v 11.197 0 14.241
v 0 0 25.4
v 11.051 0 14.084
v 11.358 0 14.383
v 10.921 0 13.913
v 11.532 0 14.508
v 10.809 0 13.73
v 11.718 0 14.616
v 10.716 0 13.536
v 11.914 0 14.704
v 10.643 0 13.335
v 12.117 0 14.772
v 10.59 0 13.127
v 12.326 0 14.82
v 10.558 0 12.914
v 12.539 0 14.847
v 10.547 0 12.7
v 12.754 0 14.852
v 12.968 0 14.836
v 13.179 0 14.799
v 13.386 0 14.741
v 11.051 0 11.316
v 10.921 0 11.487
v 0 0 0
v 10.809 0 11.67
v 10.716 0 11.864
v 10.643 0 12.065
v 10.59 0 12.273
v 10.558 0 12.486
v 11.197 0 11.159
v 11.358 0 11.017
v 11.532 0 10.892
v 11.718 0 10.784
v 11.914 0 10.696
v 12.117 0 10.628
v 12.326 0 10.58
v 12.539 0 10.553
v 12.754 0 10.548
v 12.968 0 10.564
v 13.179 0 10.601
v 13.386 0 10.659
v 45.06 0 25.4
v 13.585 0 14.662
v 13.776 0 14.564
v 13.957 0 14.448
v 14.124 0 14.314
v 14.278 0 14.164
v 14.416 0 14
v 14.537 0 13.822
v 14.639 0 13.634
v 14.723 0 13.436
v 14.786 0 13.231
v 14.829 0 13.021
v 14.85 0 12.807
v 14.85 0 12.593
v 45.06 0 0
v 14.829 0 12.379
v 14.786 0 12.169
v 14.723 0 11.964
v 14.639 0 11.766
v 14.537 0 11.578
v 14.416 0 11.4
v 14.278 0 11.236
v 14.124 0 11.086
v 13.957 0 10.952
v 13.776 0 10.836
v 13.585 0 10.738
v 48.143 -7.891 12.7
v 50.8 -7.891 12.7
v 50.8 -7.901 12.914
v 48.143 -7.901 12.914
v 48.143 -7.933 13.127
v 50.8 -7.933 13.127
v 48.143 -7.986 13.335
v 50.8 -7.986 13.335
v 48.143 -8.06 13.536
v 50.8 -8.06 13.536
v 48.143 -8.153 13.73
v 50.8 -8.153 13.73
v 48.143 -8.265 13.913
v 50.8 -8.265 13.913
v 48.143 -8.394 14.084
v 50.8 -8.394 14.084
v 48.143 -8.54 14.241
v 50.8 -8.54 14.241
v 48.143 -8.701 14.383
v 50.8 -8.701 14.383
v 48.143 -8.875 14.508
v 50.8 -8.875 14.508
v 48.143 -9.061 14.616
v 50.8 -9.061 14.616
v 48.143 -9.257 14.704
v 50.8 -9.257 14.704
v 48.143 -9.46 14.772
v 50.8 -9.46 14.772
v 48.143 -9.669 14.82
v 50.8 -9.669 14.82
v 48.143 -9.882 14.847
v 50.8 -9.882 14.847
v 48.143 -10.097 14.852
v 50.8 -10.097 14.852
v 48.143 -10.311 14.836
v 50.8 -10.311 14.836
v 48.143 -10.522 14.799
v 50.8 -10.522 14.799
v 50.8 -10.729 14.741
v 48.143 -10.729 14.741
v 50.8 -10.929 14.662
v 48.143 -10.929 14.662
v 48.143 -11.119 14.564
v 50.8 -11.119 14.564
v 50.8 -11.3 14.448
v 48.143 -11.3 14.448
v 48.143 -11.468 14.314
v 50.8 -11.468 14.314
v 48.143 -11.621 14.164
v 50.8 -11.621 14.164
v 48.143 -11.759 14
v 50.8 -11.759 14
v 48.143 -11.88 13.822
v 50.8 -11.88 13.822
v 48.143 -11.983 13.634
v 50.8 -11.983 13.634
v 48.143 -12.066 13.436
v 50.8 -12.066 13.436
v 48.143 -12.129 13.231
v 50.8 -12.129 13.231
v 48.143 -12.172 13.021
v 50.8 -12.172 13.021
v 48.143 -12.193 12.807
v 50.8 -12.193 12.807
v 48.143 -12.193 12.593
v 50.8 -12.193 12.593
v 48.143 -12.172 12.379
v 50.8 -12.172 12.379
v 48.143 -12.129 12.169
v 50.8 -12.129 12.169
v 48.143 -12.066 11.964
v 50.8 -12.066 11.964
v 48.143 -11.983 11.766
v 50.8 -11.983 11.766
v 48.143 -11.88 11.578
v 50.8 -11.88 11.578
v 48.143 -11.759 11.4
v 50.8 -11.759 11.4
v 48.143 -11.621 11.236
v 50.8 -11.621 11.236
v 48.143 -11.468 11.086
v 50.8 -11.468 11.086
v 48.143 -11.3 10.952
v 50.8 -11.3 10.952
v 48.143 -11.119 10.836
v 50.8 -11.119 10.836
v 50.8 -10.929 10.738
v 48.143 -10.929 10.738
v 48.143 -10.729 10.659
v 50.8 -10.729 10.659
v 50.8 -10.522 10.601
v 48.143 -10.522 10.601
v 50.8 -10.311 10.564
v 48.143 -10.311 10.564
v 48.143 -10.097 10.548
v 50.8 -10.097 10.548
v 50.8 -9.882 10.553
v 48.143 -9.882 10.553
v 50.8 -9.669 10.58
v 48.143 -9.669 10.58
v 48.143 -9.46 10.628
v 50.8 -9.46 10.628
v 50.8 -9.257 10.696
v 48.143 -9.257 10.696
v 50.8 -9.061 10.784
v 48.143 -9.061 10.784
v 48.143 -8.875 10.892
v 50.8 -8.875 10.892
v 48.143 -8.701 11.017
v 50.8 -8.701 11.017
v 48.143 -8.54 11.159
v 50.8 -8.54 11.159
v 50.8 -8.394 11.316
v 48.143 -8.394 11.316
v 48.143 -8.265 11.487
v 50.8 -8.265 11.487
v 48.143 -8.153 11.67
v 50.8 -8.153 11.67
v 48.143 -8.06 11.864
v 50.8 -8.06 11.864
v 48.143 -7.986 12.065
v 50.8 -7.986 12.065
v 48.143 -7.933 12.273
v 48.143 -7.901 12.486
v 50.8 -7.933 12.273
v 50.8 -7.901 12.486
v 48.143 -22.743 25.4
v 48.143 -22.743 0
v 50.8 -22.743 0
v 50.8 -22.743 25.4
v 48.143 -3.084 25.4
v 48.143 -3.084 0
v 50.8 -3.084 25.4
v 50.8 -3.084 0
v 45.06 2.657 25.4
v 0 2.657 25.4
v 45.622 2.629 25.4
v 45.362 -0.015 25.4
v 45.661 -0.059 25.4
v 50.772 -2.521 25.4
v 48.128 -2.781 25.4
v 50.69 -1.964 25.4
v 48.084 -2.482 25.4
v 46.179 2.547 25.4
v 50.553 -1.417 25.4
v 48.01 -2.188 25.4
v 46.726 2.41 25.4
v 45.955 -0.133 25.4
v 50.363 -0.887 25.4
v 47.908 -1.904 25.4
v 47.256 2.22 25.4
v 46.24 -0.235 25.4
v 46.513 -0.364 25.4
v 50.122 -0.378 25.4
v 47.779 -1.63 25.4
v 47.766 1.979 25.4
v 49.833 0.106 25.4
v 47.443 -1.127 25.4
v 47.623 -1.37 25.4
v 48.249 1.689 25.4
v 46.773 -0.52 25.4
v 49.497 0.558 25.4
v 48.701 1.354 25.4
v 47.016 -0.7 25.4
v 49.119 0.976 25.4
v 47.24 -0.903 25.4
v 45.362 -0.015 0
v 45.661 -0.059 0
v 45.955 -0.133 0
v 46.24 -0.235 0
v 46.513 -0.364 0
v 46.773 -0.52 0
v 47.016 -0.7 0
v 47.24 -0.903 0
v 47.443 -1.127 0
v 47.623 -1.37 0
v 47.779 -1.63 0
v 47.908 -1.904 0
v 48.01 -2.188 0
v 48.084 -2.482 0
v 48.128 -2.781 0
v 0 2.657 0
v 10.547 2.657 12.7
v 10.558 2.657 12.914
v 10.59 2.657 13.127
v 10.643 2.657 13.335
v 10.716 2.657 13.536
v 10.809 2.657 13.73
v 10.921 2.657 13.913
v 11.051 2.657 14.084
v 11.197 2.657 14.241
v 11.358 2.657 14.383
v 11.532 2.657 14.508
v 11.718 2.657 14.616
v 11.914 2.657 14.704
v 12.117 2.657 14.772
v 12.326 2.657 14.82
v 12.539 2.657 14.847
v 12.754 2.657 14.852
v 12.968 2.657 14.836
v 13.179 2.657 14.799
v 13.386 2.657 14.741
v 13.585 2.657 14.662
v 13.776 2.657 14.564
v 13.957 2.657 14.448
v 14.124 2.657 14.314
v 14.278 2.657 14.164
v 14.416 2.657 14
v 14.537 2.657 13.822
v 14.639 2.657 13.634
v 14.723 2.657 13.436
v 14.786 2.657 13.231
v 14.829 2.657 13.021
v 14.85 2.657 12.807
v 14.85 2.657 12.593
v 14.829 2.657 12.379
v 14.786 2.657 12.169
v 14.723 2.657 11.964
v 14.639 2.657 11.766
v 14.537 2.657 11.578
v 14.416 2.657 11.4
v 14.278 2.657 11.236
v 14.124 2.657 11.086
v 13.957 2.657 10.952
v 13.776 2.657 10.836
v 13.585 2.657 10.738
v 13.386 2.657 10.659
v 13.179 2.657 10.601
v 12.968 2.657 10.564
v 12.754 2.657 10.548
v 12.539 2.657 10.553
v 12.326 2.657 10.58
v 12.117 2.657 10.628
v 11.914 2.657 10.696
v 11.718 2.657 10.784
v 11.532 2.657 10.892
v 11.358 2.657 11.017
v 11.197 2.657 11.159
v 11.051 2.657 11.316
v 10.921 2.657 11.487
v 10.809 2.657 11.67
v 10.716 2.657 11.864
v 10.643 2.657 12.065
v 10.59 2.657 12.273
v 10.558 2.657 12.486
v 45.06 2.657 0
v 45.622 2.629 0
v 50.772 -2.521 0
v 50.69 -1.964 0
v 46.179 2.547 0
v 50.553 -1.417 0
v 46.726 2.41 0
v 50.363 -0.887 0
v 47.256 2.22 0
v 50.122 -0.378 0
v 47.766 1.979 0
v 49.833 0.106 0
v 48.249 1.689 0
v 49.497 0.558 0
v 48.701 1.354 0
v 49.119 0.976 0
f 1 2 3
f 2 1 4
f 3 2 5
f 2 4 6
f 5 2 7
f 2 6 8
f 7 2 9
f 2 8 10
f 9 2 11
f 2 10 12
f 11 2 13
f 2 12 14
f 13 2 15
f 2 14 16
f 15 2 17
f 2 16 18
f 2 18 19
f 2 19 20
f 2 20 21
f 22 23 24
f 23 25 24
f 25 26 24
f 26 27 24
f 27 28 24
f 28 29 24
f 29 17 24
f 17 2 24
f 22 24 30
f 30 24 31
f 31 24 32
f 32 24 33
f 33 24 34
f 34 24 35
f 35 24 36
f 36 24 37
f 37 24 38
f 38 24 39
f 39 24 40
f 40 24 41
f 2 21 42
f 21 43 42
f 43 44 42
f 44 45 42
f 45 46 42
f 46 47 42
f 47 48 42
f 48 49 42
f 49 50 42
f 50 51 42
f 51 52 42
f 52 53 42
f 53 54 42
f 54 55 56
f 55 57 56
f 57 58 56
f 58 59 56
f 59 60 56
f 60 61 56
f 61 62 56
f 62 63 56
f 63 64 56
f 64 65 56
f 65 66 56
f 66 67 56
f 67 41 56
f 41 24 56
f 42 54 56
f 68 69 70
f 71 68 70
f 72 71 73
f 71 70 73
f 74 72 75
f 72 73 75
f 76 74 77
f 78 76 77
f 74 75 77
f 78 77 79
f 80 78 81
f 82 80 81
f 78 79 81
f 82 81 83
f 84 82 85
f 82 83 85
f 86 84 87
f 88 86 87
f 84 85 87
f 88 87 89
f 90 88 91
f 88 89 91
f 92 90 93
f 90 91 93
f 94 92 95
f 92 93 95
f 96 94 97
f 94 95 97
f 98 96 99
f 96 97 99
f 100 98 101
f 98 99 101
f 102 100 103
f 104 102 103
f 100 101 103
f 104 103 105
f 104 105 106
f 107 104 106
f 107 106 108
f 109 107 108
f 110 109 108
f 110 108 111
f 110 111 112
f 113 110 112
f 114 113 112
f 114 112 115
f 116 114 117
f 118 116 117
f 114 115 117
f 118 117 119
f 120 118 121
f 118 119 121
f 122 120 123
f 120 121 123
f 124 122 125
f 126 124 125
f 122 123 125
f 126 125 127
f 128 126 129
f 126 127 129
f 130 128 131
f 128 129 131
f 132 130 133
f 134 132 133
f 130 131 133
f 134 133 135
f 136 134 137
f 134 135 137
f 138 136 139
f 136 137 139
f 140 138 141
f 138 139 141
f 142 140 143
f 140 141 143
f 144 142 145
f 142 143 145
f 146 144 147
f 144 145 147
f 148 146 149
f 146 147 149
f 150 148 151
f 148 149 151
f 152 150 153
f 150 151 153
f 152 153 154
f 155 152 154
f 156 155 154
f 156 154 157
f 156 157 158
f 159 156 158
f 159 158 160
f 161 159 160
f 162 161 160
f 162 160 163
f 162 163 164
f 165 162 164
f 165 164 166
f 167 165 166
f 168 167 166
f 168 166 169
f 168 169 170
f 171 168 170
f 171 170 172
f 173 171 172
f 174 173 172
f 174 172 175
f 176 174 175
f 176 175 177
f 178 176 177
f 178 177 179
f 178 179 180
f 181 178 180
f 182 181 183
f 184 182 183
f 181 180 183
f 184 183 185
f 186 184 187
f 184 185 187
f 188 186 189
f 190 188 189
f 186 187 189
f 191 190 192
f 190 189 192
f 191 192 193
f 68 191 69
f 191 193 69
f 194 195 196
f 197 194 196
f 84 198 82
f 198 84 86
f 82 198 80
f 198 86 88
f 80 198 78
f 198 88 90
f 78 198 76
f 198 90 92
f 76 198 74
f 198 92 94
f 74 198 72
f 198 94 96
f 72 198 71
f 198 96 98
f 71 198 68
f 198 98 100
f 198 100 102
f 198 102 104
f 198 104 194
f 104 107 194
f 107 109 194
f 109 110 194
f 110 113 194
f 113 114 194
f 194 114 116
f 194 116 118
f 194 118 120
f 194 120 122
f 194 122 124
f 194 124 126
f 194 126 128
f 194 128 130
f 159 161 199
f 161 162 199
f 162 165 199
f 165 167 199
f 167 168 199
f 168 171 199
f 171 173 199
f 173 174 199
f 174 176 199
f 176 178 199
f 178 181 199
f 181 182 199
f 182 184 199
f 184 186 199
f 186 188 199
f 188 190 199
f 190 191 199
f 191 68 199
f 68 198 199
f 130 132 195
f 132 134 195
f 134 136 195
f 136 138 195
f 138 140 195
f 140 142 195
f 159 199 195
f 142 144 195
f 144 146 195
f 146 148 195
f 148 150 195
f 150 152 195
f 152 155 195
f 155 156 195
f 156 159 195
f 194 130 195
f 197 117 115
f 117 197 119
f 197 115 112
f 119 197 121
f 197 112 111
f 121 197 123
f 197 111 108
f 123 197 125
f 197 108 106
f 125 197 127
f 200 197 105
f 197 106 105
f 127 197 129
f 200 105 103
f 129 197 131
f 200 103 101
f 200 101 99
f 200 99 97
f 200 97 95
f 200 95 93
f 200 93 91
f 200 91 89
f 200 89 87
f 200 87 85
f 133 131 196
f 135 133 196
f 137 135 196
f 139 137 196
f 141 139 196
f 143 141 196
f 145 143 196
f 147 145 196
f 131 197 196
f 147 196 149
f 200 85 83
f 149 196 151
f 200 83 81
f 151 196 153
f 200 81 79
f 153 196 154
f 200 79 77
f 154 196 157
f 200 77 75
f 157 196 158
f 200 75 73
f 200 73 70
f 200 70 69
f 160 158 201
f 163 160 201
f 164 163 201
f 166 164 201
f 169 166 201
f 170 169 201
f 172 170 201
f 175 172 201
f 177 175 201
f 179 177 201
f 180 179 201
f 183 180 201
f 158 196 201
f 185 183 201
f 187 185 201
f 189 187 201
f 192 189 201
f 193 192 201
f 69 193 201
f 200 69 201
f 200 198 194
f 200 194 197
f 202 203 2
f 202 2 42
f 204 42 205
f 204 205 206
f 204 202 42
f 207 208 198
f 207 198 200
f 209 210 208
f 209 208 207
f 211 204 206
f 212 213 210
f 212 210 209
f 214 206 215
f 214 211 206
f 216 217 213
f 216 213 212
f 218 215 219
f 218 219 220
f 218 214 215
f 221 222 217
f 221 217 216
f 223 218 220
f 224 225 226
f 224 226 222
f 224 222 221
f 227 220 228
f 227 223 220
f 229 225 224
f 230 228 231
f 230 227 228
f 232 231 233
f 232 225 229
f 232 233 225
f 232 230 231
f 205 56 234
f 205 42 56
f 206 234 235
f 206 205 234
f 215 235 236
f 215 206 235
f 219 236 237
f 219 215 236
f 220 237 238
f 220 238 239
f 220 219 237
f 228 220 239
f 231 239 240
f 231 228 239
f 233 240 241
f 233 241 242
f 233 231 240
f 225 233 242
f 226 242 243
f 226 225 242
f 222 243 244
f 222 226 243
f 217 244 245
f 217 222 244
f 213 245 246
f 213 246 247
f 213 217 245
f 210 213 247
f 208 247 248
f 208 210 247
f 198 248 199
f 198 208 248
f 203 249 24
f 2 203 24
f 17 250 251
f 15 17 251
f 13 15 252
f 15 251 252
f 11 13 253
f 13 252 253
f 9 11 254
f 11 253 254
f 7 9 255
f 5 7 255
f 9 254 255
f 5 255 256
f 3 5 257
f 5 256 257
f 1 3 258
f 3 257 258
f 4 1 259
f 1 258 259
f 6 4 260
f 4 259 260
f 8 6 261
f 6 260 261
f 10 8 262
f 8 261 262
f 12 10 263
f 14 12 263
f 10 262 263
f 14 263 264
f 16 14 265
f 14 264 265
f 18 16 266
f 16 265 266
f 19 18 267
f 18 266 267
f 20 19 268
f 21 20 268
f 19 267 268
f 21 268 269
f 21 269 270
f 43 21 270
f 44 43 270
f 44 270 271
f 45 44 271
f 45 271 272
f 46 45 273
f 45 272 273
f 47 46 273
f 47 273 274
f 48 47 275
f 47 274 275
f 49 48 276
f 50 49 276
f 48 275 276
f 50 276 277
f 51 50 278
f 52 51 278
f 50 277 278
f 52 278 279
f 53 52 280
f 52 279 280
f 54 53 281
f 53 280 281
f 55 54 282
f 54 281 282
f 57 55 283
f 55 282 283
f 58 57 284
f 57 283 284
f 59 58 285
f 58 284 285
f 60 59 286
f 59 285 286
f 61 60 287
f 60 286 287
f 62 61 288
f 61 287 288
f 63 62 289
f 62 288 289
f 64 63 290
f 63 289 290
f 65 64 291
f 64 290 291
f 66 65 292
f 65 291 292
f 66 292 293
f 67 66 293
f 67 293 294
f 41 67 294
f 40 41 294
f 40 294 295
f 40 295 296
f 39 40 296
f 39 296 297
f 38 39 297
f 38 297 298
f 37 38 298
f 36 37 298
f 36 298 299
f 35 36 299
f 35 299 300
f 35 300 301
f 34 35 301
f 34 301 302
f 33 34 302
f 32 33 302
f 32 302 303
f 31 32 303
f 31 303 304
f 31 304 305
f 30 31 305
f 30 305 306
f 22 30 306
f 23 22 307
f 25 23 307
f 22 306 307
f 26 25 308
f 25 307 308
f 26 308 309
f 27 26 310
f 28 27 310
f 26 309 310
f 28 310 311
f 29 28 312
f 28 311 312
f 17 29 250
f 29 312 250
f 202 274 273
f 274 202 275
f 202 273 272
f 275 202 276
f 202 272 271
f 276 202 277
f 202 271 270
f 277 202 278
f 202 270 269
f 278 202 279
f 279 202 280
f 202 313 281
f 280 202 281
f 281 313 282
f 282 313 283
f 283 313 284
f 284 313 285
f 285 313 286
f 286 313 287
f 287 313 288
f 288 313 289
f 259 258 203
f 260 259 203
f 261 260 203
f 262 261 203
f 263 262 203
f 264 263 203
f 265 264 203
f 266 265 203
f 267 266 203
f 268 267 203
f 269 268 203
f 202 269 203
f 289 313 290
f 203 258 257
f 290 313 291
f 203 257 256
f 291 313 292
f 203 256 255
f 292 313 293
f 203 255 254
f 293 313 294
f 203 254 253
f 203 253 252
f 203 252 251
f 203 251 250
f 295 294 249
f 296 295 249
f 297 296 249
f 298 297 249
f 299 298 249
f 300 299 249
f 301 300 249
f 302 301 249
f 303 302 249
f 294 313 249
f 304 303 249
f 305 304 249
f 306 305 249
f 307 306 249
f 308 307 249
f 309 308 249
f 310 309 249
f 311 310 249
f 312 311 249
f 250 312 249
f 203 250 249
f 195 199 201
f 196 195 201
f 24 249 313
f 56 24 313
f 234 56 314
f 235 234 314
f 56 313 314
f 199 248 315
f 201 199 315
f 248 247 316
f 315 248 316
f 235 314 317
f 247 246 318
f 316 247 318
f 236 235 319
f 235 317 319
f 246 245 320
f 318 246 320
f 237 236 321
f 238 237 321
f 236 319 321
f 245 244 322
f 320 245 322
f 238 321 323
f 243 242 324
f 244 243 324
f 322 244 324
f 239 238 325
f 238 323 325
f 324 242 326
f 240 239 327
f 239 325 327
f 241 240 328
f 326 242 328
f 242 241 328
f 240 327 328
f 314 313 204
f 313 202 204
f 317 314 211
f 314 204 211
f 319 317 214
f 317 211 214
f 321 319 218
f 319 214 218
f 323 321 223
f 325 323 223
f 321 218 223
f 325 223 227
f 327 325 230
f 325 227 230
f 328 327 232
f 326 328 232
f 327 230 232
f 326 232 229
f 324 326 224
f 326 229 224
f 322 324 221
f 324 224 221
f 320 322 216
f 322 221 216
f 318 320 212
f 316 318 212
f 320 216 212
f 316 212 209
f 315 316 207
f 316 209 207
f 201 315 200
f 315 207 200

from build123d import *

# Parameters (mm, degrees)
F1_DEPTH = 25.4
F2_R     = 2.15265
F3_DEPTH = 2.65684
F4_R     = 2.15265
F5_DEPTH = 2.65684
F6_R     = 3.08356
F7_R     = 5.7404


with BuildPart() as f1:
    # F0 (on Top) → F1 (new body)
    with BuildSketch(Plane.XY):
        Polygon((0, 2.65684), (0, 0), (48.14316, 0), (48.14316, -22.74316), (50.8, -22.74316), (50.8, 2.65684), align=None)
    extrude(amount=F1_DEPTH)

    # F2 (on face) → F3 (cut, through all)
    with BuildSketch(Plane(origin=(0, 2.65684, 0), x_dir=(-1, 0, 0), z_dir=(0, 1, 0))):
        with Locations((-12.7, 12.7)):
            Circle(F2_R)
    extrude(amount=-F3_DEPTH, mode=Mode.SUBTRACT)

    # F4 (on face) → F5 (cut, through all)
    with BuildSketch(Plane.YZ.offset(50.8)):
        with Locations((-10.04316, 12.7)):
            Circle(F4_R)
    extrude(amount=-F5_DEPTH, mode=Mode.SUBTRACT)

    # F6
    f6_edges = [f1.edges().sort_by_distance(p)[0] for p in [
        (48.14316, 0, 12.7),
    ]]
    fillet(f6_edges, radius=F6_R)

    # F7
    f7_edges = [f1.edges().sort_by_distance(p)[0] for p in [
        (50.8, 2.65684, 12.7),
    ]]
    fillet(f7_edges, radius=F7_R)


solid = f1.part
